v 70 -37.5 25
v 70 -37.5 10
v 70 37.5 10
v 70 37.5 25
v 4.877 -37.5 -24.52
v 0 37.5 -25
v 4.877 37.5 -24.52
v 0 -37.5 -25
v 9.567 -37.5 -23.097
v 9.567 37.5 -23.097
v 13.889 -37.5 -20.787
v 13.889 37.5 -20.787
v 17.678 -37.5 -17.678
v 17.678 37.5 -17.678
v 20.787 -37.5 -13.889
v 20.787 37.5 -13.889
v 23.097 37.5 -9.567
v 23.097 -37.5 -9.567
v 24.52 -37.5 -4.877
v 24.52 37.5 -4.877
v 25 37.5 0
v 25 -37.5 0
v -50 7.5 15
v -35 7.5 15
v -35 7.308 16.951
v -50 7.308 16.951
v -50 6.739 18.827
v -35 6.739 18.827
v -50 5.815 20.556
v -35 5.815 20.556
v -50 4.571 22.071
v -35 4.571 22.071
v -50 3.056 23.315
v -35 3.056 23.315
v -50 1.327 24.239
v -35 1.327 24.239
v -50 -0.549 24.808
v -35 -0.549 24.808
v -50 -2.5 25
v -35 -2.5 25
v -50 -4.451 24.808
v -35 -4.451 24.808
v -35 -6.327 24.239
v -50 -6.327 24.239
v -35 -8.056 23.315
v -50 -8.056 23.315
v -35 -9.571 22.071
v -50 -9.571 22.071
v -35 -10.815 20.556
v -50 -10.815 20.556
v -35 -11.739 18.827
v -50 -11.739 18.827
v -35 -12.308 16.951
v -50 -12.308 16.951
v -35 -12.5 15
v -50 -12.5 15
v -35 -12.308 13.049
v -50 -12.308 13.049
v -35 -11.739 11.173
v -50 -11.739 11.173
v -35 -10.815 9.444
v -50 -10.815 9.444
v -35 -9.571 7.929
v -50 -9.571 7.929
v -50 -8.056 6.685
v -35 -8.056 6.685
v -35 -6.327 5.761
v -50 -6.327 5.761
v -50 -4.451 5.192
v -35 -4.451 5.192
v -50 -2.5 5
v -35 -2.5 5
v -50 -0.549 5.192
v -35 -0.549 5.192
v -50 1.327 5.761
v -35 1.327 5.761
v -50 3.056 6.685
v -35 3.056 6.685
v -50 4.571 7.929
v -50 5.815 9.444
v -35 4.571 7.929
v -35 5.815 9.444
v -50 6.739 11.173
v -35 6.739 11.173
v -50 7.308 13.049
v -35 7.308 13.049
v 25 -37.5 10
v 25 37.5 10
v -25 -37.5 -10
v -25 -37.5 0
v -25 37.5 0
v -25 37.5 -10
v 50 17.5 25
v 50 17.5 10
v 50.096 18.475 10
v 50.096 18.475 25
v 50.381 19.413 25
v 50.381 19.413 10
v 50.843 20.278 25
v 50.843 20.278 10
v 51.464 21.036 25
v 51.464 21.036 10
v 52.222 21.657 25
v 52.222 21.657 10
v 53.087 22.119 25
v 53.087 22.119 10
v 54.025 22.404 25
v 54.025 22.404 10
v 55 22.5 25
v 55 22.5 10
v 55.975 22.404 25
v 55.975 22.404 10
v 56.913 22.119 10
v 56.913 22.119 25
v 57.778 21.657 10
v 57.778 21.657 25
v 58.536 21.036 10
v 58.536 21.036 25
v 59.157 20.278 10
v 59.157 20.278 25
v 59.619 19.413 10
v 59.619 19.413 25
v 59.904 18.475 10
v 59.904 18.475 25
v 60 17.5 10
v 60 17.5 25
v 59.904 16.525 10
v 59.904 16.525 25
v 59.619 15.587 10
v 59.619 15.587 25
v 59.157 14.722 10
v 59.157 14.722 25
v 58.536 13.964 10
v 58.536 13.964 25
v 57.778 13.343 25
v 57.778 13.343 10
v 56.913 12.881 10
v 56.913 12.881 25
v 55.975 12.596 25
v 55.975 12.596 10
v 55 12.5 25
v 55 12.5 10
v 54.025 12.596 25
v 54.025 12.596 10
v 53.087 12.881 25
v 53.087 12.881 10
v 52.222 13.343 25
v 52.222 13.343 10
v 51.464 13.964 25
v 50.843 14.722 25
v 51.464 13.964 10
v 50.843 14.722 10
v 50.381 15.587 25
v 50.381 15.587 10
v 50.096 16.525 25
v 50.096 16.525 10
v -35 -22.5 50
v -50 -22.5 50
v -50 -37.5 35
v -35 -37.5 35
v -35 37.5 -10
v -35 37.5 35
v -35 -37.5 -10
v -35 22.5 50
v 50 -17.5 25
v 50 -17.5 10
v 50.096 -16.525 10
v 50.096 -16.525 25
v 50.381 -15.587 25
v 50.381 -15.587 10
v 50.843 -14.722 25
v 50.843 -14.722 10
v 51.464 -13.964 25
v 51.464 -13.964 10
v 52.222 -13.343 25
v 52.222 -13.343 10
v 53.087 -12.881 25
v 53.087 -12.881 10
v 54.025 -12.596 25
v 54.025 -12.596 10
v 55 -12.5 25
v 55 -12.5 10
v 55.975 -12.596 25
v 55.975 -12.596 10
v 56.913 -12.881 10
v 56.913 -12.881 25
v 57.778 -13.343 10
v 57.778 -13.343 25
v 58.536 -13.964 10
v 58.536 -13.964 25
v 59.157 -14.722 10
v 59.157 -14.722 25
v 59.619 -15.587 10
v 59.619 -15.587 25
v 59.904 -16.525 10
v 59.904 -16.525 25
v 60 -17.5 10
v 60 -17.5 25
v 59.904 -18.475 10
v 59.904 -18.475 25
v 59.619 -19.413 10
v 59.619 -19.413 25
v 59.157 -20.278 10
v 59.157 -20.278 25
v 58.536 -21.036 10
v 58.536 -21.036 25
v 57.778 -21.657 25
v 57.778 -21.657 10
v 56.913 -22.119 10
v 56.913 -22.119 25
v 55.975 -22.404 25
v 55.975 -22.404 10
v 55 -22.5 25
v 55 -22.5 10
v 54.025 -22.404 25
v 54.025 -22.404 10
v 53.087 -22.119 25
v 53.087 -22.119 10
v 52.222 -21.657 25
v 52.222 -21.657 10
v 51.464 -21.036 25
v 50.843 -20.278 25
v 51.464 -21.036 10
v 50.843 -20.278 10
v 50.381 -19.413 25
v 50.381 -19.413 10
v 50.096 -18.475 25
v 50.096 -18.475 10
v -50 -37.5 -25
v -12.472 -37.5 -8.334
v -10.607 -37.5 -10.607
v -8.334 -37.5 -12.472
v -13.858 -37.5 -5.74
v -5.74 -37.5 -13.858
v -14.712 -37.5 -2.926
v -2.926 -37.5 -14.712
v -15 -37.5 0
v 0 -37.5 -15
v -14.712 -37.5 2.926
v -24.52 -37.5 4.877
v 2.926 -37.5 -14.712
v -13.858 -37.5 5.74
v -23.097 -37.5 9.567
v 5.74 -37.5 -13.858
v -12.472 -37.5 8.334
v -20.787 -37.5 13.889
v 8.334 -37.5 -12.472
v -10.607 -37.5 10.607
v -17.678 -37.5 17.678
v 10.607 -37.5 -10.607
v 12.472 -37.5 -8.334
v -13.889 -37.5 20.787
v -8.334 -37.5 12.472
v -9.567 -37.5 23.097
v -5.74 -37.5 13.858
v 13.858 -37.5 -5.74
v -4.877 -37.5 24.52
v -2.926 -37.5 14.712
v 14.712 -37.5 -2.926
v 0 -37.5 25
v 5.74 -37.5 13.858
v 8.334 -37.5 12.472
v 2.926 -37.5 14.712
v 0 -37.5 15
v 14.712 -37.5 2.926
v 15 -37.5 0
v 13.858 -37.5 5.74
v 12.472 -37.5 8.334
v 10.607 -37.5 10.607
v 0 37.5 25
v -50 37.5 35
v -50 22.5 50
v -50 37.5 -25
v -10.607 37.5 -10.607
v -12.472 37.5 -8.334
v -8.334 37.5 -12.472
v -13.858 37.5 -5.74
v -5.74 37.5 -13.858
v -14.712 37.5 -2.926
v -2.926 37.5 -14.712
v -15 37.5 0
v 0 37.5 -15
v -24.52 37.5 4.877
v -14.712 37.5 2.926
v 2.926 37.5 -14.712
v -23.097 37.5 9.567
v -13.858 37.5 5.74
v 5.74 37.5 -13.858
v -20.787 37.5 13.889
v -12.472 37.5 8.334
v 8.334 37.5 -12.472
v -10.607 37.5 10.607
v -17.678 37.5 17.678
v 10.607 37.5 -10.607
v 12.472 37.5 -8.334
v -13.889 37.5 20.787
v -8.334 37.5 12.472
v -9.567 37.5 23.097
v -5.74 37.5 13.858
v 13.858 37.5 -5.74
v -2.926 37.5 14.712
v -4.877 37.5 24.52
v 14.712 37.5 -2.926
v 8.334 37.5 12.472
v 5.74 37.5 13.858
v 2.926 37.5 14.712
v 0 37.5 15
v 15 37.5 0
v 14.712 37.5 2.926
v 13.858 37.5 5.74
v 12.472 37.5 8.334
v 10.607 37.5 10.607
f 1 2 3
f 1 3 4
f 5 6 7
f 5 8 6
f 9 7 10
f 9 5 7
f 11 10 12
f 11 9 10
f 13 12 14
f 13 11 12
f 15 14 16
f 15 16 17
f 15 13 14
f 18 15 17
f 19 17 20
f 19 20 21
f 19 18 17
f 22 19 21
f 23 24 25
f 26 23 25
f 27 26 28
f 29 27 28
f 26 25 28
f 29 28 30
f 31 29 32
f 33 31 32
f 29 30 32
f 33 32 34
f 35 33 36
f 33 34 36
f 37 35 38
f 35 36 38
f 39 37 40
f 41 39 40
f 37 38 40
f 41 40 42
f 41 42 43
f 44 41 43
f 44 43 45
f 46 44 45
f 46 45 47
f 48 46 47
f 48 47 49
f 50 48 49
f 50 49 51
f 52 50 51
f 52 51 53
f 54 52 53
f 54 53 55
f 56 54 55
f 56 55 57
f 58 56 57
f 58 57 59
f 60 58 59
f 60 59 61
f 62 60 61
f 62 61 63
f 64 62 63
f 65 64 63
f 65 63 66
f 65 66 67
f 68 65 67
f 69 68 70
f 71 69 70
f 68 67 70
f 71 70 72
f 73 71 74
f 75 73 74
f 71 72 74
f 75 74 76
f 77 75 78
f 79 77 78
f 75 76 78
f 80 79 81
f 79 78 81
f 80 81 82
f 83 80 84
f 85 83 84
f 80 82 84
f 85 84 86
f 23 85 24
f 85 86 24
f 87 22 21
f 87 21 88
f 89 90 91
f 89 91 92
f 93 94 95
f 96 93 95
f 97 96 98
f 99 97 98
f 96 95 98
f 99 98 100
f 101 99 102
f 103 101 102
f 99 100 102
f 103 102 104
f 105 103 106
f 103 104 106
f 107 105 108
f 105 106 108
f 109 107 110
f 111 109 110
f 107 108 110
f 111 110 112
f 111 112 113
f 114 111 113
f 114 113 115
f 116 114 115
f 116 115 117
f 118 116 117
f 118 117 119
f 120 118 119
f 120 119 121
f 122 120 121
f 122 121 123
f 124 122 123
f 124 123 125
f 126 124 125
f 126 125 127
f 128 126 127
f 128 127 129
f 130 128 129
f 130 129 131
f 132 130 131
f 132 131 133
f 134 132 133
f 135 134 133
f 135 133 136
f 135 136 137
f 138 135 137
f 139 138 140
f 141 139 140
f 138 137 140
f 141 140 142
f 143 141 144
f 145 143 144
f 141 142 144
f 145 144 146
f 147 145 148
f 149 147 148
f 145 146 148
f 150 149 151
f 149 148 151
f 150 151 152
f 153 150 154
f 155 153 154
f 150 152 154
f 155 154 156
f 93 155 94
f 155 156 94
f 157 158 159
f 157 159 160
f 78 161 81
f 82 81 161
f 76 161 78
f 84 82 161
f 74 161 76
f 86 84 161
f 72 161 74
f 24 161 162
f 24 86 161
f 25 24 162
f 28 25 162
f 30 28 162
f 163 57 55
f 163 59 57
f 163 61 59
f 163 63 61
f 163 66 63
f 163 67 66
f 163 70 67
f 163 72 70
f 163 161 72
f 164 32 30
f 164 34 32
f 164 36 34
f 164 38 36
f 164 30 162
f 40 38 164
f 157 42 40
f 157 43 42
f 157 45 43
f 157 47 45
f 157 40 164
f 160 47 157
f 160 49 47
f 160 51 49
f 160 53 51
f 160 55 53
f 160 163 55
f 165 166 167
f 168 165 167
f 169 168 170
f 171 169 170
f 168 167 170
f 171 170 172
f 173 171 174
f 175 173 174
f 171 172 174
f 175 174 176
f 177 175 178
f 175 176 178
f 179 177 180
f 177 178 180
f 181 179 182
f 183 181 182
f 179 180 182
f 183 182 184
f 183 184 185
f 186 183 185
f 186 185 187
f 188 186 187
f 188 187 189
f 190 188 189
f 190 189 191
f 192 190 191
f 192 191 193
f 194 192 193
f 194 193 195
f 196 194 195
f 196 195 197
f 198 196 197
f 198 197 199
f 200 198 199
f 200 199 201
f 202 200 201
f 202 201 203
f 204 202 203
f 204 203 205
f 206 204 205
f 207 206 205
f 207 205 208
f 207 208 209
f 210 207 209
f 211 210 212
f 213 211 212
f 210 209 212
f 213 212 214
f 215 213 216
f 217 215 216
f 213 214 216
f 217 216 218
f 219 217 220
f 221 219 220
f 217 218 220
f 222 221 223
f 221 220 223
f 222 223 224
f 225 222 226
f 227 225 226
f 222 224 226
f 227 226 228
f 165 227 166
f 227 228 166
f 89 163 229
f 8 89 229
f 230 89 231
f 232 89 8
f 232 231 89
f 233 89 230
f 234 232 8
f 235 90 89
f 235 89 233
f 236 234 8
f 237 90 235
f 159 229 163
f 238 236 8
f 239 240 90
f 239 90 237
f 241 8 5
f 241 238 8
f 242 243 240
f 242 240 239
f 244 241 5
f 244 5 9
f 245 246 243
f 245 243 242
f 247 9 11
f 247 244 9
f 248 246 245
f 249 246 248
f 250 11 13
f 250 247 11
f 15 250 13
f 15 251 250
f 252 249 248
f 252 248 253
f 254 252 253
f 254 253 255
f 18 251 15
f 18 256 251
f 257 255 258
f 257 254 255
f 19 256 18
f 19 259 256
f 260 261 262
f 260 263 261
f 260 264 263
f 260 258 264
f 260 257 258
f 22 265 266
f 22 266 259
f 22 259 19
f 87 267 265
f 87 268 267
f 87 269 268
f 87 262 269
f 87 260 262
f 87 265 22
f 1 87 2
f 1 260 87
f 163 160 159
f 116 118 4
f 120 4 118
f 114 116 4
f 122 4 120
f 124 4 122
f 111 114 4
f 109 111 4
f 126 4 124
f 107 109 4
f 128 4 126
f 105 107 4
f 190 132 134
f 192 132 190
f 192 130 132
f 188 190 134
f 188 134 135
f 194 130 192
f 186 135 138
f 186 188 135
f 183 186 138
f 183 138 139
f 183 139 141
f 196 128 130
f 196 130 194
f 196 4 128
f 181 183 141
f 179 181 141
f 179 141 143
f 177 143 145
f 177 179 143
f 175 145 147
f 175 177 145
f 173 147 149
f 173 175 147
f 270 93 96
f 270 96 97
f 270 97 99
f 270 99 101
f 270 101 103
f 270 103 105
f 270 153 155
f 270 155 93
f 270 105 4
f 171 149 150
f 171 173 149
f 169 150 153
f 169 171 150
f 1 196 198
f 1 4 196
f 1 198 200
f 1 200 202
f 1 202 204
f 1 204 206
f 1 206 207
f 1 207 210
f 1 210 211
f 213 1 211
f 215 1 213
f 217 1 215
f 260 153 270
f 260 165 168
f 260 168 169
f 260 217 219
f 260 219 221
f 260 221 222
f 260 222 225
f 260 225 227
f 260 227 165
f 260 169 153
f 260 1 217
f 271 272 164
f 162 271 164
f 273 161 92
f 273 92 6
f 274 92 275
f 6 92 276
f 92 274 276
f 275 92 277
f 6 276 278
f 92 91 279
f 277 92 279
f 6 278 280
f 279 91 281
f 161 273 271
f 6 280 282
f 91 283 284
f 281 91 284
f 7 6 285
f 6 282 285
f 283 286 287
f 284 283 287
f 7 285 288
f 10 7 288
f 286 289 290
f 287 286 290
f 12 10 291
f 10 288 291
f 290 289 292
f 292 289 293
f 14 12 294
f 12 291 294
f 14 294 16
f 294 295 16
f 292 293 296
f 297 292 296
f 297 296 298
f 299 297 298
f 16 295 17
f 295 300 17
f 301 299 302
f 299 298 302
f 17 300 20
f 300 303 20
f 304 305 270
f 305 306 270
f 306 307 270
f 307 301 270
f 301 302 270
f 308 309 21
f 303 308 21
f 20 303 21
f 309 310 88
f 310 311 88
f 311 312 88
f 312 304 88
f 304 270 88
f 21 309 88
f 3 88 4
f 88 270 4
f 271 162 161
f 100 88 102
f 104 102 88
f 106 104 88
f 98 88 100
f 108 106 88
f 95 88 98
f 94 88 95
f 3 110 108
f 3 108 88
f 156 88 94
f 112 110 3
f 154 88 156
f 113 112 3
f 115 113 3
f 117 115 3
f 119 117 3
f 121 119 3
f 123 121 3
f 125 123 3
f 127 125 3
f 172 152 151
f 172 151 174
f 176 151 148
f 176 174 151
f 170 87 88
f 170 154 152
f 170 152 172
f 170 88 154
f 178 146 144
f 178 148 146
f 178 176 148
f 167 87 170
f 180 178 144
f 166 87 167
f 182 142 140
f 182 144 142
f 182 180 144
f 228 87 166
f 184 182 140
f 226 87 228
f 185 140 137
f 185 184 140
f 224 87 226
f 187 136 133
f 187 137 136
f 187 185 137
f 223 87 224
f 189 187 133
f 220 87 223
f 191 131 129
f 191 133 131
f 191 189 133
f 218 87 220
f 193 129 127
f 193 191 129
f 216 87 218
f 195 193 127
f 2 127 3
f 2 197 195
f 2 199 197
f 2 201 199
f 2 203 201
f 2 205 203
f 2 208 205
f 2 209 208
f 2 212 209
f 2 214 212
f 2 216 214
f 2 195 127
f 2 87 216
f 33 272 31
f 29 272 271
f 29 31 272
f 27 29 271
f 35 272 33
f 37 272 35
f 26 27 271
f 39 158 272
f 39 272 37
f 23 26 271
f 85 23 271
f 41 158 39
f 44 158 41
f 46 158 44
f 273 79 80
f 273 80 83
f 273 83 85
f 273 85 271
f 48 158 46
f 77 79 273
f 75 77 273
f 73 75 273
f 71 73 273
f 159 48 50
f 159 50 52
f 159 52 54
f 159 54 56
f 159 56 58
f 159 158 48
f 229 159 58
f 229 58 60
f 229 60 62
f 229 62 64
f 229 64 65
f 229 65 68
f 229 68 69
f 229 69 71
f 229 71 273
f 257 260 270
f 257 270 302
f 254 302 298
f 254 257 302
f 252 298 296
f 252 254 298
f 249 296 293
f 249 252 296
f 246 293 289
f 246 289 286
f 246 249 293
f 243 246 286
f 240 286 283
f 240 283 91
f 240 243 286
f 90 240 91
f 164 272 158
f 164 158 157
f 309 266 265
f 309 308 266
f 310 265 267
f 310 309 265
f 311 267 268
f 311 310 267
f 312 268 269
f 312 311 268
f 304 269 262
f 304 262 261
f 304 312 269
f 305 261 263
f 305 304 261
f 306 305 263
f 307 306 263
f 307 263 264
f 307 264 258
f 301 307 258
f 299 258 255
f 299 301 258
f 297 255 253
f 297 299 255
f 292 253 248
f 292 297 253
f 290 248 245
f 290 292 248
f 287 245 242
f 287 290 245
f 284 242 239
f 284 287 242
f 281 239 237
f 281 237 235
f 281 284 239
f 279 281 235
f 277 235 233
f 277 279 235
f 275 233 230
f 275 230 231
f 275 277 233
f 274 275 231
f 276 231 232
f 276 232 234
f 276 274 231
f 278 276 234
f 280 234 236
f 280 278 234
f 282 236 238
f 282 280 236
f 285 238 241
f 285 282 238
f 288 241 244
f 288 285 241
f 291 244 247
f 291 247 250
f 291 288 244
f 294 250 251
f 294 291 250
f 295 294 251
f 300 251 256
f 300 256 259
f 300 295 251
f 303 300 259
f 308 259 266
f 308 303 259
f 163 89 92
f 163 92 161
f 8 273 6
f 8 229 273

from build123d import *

# Parameters (mm, degrees)
F0_R     = 15
F0_W     = 45
F0_H     = 15
F0_W_2   = 15
F1_DEPTH = 37.5
F2_SIZE  = 15
F4_DEPTH = 15
F5_D     = 20
F5_DEPTH = 15.001
F7_D     = 10


with BuildPart() as f1:
    # F0 (on Front) → F1 (new body, symmetric)
    with BuildSketch(Plane.XZ):
        with BuildLine():
            Line((-25, -25), (0, -25))
            ThreePointArc((0, -25), (17.6776695297, -17.6776695297), (25, 0))
            Line((25, 0), (25, 10))
            Line((25, 10), (25, 25))
            Line((25, 25), (0, 25))
            ThreePointArc((0, 25), (-17.6776695297, 17.6776695297), (-25, 0))
            Line((-25, 0), (-25, -10))
            Line((-25, -10), (-25, -25))
        make_face()
        Circle(F0_R, mode=Mode.SUBTRACT)
        Polygon((-50, -25), (-25, -25), (-25, -10), (-35, -10), (-35, 35), (-50, 35), align=None)
        with Locations((47.5, 17.5)):
            Rectangle(F0_W, F0_H)
        with Locations((-42.5, 42.5)):
            Rectangle(F0_W_2, F0_H)
    extrude(amount=F1_DEPTH, both=True)

    # F2
    f2_edges = [f1.edges().sort_by_distance(p)[0] for p in [
        (-42.5, -37.5, 50),
        (-42.5, 37.5, 50),
    ]]
    chamfer(f2_edges, length=F2_SIZE)

    # F3 (on face) → F4 (join, through all)
    with BuildSketch(Plane.YZ.offset(-35)):
        with BuildLine():
            ThreePointArc((-12.5, 15), (-2.5, 5), (7.5, 15))
            ThreePointArc((7.5, 15), (4.5710678119, 22.0710678119), (-2.5, 25))
            Line((-2.5, 25), (-2.5, 15))
            Line((-2.5, 15), (-12.5, 15))
        make_face()
    extrude(amount=-F4_DEPTH)

    # F5 (through all, one way)
    with BuildSketch(Plane.YZ.offset(-35)):
        with Locations((-2.5, 15)):
            Circle(F5_D / 2)
    extrude(amount=-F5_DEPTH, mode=Mode.SUBTRACT)

    # F7 (through all)
    with Locations(Plane.XY.offset(25)):
        with Locations((55, -17.5), (55, 17.5)):
            Hole(F7_D / 2)


solid = f1.part
